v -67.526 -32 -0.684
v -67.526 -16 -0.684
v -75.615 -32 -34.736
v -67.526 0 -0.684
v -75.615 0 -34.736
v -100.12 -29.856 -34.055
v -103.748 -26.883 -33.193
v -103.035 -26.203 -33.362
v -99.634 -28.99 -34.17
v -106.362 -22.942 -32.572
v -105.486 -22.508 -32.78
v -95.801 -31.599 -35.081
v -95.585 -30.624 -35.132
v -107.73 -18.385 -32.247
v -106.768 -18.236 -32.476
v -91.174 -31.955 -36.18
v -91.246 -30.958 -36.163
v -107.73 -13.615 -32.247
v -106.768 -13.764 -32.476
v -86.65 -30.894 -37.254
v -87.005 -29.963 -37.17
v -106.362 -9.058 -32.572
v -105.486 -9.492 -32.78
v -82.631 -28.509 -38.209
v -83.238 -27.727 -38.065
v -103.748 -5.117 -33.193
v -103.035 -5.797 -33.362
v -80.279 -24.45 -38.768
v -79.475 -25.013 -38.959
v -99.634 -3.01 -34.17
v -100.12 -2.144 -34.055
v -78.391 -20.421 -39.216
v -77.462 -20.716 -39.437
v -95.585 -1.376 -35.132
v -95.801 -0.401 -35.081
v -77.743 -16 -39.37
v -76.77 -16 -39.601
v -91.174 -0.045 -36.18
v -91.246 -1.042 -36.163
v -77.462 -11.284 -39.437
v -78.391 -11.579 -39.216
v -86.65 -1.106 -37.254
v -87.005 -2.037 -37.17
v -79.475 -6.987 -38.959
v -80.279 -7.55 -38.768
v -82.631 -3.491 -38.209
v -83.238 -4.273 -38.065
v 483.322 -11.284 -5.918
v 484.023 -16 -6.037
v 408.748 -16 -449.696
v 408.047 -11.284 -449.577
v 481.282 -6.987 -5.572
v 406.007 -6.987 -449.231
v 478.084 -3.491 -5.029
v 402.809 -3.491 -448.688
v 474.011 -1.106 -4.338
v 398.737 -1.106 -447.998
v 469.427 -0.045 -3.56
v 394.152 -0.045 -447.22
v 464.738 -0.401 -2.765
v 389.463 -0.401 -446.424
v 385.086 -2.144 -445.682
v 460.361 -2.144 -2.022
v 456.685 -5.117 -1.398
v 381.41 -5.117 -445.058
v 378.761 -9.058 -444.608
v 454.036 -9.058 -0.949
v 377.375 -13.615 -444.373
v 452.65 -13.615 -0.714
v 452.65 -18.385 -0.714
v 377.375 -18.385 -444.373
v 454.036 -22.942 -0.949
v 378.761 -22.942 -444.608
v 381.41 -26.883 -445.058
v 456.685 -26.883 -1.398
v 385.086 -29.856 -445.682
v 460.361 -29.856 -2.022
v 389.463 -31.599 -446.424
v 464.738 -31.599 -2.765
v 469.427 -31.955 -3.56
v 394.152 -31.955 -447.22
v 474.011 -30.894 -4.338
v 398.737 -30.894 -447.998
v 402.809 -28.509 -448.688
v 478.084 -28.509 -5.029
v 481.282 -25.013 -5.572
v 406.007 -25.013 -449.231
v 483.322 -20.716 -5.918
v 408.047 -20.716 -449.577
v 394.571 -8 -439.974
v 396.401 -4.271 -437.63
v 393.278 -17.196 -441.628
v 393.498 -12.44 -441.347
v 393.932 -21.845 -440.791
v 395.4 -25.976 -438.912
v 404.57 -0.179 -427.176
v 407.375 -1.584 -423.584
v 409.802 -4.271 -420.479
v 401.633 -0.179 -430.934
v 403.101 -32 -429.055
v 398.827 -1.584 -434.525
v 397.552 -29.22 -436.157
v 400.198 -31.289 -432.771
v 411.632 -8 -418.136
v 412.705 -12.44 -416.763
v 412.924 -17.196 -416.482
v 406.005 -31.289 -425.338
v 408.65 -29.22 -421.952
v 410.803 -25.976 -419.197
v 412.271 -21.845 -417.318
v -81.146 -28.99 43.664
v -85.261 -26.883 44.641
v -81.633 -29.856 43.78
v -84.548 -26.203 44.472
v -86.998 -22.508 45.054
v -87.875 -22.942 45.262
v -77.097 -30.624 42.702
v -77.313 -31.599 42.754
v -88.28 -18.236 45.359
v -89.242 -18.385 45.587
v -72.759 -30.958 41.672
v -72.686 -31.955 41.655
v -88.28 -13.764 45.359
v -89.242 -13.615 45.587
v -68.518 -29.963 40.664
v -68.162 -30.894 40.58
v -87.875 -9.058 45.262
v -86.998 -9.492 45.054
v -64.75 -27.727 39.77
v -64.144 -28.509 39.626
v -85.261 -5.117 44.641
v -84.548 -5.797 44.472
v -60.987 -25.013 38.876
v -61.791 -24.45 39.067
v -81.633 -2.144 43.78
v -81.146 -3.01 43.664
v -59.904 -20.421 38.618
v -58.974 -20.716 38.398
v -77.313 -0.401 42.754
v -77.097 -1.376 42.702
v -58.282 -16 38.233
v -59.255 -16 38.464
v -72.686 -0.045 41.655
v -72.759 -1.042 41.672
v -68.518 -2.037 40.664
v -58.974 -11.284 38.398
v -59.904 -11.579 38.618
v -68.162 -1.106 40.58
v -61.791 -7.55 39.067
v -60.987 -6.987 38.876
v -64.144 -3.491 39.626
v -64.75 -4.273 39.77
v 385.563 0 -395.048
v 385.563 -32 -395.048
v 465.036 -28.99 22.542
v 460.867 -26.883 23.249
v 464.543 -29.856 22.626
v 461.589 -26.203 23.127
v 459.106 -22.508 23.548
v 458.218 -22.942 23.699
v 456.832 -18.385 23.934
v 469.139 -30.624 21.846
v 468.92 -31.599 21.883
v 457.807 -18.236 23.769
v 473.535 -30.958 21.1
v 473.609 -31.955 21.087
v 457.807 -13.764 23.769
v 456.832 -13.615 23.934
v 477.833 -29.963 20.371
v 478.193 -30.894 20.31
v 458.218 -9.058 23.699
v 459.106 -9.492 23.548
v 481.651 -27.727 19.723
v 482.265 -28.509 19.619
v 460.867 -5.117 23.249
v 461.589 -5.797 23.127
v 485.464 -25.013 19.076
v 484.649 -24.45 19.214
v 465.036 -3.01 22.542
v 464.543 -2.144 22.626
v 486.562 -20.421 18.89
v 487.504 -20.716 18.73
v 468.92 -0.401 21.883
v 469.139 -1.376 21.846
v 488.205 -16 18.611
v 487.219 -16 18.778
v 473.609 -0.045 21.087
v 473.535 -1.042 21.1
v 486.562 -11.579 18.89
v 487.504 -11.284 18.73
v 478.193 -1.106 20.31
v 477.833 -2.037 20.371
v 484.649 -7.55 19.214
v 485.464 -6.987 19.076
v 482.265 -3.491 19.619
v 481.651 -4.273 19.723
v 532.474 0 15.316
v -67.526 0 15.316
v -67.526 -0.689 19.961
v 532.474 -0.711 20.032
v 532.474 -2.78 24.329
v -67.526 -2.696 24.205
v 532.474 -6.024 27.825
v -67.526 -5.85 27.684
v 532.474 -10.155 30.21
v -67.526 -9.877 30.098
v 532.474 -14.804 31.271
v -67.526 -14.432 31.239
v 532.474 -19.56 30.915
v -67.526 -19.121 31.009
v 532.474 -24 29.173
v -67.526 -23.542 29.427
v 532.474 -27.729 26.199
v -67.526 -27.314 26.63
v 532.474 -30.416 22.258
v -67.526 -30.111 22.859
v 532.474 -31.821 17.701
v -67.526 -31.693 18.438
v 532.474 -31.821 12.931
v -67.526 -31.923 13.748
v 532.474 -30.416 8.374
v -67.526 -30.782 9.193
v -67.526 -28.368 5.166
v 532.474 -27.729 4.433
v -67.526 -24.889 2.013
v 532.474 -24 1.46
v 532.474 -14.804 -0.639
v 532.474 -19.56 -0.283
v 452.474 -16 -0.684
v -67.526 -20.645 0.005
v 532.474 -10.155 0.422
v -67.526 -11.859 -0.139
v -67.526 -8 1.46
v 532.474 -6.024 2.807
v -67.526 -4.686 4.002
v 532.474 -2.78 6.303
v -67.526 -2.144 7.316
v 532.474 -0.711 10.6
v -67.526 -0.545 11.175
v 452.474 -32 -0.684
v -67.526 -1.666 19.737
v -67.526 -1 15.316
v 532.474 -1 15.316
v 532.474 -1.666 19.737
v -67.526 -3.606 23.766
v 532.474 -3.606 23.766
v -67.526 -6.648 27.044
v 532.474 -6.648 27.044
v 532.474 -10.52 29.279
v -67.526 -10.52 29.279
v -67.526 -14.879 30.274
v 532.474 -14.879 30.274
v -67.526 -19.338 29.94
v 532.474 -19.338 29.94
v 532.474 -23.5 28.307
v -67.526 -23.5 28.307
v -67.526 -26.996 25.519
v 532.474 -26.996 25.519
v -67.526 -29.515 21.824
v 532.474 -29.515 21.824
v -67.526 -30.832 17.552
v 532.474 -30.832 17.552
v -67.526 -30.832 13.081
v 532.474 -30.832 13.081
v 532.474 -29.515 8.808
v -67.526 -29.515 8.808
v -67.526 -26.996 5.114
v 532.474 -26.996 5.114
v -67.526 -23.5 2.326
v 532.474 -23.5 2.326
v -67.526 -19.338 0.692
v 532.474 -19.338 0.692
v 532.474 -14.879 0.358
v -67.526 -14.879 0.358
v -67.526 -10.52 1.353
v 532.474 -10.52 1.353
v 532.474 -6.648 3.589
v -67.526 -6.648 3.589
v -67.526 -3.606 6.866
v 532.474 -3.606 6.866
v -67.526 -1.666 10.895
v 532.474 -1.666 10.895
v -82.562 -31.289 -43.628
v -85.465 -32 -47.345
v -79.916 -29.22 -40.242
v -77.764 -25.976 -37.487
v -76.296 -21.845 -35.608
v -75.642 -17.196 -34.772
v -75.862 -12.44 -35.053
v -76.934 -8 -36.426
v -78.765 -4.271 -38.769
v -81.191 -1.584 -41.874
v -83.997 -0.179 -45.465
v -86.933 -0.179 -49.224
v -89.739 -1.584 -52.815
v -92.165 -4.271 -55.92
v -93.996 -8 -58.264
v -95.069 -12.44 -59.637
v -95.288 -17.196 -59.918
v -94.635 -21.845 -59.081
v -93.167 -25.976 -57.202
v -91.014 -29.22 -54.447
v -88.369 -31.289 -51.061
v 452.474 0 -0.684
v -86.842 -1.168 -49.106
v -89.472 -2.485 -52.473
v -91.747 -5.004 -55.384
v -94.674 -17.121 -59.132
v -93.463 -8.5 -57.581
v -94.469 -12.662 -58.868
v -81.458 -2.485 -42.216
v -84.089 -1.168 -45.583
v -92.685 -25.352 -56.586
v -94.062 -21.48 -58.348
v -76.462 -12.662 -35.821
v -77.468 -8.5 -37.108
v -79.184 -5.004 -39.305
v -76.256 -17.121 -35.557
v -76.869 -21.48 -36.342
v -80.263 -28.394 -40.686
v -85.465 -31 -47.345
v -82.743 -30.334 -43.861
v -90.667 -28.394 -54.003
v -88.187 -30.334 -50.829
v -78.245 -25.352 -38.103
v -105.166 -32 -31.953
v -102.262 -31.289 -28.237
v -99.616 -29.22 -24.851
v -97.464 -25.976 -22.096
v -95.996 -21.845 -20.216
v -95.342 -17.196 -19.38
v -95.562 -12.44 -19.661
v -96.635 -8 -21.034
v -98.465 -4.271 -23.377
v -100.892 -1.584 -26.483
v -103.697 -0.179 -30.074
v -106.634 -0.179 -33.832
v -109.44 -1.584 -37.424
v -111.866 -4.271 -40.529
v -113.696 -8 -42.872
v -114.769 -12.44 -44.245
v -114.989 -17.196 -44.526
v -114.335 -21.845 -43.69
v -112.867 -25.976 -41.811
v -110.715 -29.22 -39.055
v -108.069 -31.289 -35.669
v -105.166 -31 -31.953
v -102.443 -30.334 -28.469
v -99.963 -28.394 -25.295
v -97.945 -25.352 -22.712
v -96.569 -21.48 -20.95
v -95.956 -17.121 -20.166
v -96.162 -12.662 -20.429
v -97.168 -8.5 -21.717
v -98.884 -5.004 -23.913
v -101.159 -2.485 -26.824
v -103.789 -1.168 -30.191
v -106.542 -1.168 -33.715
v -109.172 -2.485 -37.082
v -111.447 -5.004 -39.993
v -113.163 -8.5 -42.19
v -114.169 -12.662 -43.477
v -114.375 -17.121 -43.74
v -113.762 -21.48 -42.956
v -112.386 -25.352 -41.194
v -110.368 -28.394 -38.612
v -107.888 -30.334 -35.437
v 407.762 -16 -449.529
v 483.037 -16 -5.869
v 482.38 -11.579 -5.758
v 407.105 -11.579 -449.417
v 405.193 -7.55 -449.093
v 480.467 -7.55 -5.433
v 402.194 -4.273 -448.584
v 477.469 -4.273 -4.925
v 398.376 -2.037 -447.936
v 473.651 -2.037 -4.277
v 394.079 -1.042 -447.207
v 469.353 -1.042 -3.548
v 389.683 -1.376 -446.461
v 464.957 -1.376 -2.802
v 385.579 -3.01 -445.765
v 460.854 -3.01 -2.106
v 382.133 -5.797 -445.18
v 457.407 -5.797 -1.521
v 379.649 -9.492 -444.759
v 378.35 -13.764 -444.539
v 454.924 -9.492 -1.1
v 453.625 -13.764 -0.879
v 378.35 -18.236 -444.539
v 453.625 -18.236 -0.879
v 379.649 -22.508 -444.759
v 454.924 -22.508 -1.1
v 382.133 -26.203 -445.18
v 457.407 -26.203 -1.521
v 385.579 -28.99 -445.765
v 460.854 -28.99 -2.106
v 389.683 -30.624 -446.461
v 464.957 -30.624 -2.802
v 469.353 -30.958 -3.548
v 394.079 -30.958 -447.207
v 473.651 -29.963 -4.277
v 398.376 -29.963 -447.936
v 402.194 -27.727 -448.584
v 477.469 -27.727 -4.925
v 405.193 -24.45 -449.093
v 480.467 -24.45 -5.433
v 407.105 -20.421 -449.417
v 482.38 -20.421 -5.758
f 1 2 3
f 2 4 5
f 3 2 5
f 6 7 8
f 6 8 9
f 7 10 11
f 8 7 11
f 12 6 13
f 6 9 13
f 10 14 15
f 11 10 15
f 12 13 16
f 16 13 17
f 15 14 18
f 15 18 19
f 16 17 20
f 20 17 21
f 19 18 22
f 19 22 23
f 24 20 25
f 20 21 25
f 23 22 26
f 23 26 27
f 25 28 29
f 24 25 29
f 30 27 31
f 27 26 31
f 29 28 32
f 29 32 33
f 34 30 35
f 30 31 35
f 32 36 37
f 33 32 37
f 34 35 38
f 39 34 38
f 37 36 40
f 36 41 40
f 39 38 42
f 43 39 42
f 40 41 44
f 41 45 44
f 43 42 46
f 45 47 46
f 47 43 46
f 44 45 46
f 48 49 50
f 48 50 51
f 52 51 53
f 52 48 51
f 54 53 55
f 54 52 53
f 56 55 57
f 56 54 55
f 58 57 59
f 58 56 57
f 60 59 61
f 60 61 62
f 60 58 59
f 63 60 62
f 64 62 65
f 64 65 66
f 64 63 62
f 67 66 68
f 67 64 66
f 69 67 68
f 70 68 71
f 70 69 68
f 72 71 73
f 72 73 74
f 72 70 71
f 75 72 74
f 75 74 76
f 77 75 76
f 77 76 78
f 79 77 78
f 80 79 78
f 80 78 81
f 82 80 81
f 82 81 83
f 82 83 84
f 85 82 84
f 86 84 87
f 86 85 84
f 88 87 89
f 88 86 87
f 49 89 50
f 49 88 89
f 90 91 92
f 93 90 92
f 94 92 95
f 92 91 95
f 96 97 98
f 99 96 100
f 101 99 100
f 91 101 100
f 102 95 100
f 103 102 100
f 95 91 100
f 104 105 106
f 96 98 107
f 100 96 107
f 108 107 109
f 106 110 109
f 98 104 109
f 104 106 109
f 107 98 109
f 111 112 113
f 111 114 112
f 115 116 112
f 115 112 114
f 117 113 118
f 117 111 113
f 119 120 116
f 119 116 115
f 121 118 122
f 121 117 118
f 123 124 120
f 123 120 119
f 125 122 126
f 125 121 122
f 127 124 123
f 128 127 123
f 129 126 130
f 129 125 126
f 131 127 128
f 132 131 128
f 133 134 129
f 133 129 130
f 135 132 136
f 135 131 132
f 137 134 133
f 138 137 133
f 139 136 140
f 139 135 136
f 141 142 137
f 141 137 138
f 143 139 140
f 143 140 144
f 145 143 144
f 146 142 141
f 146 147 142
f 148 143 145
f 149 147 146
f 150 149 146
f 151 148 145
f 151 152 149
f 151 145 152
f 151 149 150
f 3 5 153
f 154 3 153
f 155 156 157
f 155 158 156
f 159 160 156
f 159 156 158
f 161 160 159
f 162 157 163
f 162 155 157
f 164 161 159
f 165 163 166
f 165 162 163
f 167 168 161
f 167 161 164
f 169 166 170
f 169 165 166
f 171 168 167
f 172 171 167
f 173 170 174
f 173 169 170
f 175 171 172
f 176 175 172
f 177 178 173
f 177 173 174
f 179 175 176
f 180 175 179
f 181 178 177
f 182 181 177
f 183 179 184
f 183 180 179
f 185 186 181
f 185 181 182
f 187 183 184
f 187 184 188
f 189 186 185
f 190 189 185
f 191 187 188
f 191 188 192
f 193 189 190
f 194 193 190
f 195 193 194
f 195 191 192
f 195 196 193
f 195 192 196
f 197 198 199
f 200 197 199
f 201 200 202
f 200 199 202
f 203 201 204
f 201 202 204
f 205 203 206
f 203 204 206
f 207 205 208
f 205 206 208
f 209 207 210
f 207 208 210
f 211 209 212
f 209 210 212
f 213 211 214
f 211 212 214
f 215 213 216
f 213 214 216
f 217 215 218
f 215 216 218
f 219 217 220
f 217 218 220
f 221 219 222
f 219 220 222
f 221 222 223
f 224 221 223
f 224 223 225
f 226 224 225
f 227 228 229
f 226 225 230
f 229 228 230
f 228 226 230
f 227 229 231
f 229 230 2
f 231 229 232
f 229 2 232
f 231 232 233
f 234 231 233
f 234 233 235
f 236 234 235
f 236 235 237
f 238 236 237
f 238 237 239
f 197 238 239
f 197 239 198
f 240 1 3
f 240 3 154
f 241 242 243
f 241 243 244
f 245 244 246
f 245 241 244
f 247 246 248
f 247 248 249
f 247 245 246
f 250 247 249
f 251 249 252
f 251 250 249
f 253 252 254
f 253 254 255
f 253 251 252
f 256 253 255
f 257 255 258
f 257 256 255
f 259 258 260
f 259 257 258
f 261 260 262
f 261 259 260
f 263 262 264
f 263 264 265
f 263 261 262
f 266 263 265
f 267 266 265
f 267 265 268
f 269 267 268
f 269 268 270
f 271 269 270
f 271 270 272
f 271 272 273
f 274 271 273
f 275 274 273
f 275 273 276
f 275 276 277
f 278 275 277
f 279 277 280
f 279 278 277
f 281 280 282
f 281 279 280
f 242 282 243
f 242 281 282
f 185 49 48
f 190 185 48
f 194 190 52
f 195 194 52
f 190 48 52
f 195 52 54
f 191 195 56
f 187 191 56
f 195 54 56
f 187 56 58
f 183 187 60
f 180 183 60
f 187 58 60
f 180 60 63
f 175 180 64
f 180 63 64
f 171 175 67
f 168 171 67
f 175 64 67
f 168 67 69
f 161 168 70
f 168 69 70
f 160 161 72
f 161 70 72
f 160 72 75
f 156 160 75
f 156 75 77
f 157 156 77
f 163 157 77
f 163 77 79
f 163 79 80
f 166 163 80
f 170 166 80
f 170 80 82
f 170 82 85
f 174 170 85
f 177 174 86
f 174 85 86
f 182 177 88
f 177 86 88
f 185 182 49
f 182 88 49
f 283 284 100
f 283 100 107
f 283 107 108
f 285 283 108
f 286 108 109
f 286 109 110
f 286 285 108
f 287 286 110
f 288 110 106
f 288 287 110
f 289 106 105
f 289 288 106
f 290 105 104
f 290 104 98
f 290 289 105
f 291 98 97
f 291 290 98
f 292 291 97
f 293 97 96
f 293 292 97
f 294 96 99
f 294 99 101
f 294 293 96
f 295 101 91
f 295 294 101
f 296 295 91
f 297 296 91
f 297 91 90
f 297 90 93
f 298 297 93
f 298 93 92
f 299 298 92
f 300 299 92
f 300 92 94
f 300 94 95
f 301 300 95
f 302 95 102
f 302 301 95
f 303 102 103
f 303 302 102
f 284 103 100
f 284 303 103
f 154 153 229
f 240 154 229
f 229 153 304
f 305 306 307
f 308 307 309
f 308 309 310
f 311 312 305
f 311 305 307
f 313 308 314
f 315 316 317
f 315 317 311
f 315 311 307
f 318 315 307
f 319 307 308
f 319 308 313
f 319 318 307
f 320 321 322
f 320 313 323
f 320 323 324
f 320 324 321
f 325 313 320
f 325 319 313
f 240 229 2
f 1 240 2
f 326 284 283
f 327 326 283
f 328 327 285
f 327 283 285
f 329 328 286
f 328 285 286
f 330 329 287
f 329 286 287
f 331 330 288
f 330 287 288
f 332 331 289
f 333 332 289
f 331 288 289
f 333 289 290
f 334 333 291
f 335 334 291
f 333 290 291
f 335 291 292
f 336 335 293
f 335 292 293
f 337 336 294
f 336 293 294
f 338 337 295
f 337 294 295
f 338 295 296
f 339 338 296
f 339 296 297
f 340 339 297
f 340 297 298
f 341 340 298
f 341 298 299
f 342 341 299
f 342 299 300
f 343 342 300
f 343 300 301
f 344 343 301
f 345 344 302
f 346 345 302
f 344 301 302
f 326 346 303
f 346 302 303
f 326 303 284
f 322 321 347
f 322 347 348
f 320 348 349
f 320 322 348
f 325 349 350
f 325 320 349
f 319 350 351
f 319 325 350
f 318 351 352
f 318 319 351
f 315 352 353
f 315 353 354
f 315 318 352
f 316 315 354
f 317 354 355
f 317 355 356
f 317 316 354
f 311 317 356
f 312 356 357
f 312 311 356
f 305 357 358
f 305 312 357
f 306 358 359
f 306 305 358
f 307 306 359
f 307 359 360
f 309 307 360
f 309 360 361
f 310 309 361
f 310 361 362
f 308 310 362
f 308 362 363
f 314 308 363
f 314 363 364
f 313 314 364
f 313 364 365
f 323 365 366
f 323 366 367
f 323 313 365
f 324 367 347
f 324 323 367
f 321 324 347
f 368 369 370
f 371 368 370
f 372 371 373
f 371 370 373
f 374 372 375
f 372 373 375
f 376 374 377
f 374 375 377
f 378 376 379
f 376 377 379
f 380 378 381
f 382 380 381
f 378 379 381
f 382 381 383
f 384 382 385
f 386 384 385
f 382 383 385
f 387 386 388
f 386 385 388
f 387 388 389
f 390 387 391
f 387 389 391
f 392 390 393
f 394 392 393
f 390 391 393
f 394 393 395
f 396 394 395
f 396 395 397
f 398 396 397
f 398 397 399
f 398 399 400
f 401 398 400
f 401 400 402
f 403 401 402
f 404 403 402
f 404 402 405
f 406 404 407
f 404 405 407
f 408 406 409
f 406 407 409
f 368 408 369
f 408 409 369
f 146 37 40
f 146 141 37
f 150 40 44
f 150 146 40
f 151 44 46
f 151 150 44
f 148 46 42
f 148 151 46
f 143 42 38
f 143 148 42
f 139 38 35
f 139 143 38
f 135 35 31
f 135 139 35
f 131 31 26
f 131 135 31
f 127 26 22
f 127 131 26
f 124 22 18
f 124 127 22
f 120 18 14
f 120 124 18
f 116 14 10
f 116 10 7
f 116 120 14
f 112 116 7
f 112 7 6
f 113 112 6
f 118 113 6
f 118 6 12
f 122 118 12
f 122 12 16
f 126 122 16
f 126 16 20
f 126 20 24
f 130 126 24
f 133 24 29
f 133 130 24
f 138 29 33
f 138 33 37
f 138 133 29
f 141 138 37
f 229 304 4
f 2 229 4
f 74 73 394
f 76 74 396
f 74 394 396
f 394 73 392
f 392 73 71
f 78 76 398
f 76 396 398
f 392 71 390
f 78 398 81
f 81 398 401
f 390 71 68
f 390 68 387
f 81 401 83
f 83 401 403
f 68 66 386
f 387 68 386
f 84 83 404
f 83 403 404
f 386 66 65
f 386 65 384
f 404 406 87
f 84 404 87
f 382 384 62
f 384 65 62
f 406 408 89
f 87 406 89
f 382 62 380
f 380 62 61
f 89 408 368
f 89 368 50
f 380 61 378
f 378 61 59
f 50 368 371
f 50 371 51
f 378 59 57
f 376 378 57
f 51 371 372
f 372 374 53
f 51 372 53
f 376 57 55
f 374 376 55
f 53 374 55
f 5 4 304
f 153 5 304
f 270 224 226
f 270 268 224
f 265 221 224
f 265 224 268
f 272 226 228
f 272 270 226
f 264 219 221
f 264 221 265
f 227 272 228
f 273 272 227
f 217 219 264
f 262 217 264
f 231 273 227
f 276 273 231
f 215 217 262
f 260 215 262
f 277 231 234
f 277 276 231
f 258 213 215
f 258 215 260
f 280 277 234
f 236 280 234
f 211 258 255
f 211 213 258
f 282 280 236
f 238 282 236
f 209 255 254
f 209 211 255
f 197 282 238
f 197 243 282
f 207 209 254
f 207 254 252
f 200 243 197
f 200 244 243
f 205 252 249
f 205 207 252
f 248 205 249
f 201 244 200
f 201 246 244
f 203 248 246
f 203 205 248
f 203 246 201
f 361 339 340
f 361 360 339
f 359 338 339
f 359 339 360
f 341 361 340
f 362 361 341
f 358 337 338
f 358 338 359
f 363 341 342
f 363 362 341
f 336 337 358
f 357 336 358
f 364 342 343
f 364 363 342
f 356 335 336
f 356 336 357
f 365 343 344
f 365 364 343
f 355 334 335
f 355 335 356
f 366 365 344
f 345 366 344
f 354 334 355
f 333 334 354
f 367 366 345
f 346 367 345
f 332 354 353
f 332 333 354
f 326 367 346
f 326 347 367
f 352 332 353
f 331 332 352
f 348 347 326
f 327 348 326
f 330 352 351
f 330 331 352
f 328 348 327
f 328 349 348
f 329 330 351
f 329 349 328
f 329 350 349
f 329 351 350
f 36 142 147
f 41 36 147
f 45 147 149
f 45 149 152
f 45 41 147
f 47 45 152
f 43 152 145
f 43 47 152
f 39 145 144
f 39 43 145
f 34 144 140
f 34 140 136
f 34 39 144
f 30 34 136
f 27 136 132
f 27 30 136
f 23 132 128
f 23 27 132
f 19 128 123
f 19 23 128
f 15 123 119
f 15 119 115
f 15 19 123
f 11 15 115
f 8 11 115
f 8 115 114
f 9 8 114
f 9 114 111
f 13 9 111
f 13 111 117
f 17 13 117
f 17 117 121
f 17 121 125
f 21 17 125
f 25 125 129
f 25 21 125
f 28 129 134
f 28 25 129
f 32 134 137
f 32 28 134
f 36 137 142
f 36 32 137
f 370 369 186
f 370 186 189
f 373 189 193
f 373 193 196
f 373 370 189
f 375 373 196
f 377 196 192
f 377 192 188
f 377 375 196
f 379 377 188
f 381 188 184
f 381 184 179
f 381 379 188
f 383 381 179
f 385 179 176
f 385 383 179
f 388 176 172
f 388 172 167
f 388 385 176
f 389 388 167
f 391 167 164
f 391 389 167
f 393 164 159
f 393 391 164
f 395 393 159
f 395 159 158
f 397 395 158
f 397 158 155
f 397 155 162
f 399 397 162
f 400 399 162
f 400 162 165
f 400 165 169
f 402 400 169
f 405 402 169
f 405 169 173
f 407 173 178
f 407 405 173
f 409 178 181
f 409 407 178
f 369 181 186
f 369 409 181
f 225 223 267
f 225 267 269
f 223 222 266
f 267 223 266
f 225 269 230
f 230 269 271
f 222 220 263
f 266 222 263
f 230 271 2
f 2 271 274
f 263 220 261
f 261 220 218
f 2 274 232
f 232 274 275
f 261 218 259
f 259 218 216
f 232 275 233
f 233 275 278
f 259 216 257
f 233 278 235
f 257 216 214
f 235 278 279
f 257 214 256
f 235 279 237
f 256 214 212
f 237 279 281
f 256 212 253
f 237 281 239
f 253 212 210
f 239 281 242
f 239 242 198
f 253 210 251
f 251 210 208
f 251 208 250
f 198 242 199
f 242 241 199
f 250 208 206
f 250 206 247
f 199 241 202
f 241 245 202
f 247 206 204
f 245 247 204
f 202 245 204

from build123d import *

# Parameters (mm, degrees)
F1_DEPTH  = 32
F3_R      = 16
F3_R_2    = 15
F4_DEPTH  = 600
F6_R      = 16
F6_R_2    = 15
F7_DEPTH  = 40
F9_R      = 16
F9_R_2    = 15
F10_DEPTH = 620
F11_DEPTH = 25
F13_R     = 16
F13_R_2   = 15
F14_DEPTH = 450
F15_DEPTH = 25


with BuildPart() as f1:
    # F0 (on Front) → F1 (new body)
    with BuildSketch(Plane.XZ):
        Polygon((452.473682055, -0.6838418776), (-67.526317945, -0.6838418776), (-75.6146724134, -34.7364265371), (385.5628752696, -395.0478158095), align=None)
    extrude(amount=F1_DEPTH)

    # F3 (on face) → F4 (join)
    with BuildSketch(Plane.YZ.offset(-67.526317945)):
        with Locations((-16, 15.3161581224)):
            Circle(F3_R)
        with Locations((-16, 15.3161581224)):
            Circle(F3_R_2, mode=Mode.SUBTRACT)
    extrude(amount=F4_DEPTH)


with BuildPart() as f7:
    # F6 (on line) → F7 (new body, symmetric)
    with BuildSketch(Plane(origin=(-3.7600176862, 0, -15.8299591194), x_dir=(0.9729309903, 0, -0.231095842), z_dir=(0.231095842, 0, 0.9729309903))):
        with Locations((-81.5404143731, -16)):
            Circle(F6_R)
        with Locations((-81.5404143731, -16)):
            Circle(F6_R_2, mode=Mode.SUBTRACT)
    extrude(amount=F7_DEPTH, both=True)


with BuildPart() as f10:
    # F9 (on face) → F10 (new body)
    with BuildSketch(Plane(origin=(-30.1014555419, 0, 23.5178345518), x_dir=(0, -1, 0), z_dir=(-0.7880107536, 0, 0.6156614753))):
        with Locations((16, -89.9257184274)):
            Circle(F9_R)
        with Locations((16, -89.9257184274)):
            Circle(F9_R_2, mode=Mode.SUBTRACT)
        with Locations((16, -89.9257184274)):
            Circle(F9_R_2)
    extrude(amount=-F10_DEPTH)

    # F9 (on face) → F11 (join)
    with BuildSketch(Plane(origin=(-30.1014555419, 0, 23.5178345518), x_dir=(0, -1, 0), z_dir=(-0.7880107536, 0, 0.6156614753))):
        with Locations((16, -89.9257184274)):
            Circle(F9_R)
        with Locations((16, -89.9257184274)):
            Circle(F9_R_2, mode=Mode.SUBTRACT)
    extrude(amount=F11_DEPTH)


with BuildPart() as f14:
    # F13 (on line) → F14 (new body)
    with BuildSketch(Plane(origin=(12.5481585124, 0, 73.9572857393), x_dir=(0.9859099348, 0, -0.167277017), z_dir=(0.167277017, 0, 0.9859099348))):
        with Locations((462.2126894164, -16)):
            Circle(F13_R)
        with Locations((462.2126894164, -16)):
            Circle(F13_R_2, mode=Mode.SUBTRACT)
    extrude(amount=-F14_DEPTH)

    # F13 (on line) → F15 (join)
    with BuildSketch(Plane(origin=(12.5481585124, 0, 73.9572857393), x_dir=(0.9859099348, 0, -0.167277017), z_dir=(0.167277017, 0, 0.9859099348))):
        with Locations((462.2126894164, -16)):
            Circle(F13_R)
        with Locations((462.2126894164, -16)):
            Circle(F13_R_2, mode=Mode.SUBTRACT)
    extrude(amount=F15_DEPTH)


solid = Compound([f1.part, f7.part, f10.part, f14.part])
